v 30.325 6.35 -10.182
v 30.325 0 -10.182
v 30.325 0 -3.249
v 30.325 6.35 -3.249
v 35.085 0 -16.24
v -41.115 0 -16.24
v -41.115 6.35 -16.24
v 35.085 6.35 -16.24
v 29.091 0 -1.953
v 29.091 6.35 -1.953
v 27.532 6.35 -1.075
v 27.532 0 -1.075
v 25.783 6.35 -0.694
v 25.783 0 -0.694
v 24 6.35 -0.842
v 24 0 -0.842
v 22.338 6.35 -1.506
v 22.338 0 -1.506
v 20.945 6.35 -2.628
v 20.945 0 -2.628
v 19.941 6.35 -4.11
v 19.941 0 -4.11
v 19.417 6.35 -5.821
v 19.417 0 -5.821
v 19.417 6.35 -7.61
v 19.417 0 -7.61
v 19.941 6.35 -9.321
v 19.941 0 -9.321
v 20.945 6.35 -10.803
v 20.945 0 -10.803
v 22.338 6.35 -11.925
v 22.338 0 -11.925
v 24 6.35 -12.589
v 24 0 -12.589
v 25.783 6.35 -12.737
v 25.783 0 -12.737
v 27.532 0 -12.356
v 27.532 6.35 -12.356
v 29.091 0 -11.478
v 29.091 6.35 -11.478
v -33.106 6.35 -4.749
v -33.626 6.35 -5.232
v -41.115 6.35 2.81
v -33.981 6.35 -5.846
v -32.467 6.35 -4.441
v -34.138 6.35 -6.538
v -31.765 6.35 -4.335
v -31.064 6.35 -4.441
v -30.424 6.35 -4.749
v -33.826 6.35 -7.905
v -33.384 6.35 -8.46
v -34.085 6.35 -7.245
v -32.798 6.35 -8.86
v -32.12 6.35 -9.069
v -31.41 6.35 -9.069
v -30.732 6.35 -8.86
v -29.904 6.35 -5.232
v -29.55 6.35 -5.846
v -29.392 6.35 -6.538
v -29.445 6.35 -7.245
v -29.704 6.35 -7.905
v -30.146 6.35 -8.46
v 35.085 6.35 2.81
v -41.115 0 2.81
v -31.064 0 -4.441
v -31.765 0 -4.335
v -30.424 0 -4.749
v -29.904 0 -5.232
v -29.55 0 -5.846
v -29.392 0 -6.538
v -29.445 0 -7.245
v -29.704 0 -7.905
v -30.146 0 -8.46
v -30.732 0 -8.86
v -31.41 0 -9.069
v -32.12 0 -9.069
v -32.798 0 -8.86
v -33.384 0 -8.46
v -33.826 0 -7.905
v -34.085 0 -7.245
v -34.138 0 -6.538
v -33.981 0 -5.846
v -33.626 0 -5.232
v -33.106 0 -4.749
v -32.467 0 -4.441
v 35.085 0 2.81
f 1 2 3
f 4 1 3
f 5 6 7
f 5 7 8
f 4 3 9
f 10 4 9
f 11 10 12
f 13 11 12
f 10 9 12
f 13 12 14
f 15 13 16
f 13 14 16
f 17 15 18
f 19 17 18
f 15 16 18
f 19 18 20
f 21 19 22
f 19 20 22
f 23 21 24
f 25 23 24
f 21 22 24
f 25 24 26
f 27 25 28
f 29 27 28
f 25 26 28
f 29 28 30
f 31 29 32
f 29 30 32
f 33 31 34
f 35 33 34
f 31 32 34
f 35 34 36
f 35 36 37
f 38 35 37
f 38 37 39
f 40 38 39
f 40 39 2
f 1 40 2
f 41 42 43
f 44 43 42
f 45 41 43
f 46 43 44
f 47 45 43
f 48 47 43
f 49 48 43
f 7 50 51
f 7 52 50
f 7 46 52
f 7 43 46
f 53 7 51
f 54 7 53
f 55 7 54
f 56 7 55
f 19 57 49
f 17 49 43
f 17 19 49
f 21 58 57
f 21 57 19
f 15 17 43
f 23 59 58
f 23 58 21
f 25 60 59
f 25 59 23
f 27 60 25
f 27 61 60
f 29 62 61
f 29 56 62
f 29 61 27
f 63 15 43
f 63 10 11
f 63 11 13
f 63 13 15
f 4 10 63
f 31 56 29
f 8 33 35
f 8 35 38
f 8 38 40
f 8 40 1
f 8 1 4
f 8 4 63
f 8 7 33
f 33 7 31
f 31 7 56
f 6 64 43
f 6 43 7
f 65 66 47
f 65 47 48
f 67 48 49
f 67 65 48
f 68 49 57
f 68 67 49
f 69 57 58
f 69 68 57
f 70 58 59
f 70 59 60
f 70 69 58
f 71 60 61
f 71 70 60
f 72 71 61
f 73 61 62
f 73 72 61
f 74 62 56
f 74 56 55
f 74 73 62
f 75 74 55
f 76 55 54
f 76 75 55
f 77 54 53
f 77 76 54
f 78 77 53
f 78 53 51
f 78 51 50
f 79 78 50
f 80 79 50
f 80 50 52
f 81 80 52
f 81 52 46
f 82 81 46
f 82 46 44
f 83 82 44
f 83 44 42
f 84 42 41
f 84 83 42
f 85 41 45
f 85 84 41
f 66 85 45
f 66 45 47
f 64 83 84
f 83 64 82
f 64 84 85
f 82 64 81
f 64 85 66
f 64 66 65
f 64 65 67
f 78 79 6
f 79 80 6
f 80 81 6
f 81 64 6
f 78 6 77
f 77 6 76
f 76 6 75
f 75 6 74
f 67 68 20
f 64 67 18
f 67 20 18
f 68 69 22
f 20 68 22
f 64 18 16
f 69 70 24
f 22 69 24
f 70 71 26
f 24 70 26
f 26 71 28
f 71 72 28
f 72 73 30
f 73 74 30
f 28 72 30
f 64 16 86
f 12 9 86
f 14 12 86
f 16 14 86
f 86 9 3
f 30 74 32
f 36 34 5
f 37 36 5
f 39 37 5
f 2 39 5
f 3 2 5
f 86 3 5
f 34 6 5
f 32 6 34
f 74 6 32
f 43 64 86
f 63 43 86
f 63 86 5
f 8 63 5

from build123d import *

# Parameters (mm, degrees)
IZIM1_W                     = 76.2
IZIM1_H                     = 19.05
IZIM1_R                     = 2.38
Y_KSEKLIK_EKSTR_ZYON1_DEPTH = 6.35


with BuildPart() as part:
    # Çizim1 → Yükseklik-Ekstrüzyon1 (new body)
    with BuildSketch(Plane(origin=(0, 0, 0), x_dir=(1, 0, 0), z_dir=(0, 1, 0))):
        with Locations((-3.015107914, 6.715467626)):
            Rectangle(IZIM1_W, IZIM1_H)
        with Locations(Location((-31.765107914, 6.715467626, 0), (0, 0, 270))):
            Circle(IZIM1_R, mode=Mode.SUBTRACT)
        with BuildLine():
            Line((30.324892086, 10.182112257), (30.324892086, 3.248822995))
            ThreePointArc((30.324892086, 3.248822995), (19.349892086, 6.715467626), (30.324892086, 10.182112257))
        make_face(mode=Mode.SUBTRACT)
    extrude(amount=Y_KSEKLIK_EKSTR_ZYON1_DEPTH)


solid = part.part
